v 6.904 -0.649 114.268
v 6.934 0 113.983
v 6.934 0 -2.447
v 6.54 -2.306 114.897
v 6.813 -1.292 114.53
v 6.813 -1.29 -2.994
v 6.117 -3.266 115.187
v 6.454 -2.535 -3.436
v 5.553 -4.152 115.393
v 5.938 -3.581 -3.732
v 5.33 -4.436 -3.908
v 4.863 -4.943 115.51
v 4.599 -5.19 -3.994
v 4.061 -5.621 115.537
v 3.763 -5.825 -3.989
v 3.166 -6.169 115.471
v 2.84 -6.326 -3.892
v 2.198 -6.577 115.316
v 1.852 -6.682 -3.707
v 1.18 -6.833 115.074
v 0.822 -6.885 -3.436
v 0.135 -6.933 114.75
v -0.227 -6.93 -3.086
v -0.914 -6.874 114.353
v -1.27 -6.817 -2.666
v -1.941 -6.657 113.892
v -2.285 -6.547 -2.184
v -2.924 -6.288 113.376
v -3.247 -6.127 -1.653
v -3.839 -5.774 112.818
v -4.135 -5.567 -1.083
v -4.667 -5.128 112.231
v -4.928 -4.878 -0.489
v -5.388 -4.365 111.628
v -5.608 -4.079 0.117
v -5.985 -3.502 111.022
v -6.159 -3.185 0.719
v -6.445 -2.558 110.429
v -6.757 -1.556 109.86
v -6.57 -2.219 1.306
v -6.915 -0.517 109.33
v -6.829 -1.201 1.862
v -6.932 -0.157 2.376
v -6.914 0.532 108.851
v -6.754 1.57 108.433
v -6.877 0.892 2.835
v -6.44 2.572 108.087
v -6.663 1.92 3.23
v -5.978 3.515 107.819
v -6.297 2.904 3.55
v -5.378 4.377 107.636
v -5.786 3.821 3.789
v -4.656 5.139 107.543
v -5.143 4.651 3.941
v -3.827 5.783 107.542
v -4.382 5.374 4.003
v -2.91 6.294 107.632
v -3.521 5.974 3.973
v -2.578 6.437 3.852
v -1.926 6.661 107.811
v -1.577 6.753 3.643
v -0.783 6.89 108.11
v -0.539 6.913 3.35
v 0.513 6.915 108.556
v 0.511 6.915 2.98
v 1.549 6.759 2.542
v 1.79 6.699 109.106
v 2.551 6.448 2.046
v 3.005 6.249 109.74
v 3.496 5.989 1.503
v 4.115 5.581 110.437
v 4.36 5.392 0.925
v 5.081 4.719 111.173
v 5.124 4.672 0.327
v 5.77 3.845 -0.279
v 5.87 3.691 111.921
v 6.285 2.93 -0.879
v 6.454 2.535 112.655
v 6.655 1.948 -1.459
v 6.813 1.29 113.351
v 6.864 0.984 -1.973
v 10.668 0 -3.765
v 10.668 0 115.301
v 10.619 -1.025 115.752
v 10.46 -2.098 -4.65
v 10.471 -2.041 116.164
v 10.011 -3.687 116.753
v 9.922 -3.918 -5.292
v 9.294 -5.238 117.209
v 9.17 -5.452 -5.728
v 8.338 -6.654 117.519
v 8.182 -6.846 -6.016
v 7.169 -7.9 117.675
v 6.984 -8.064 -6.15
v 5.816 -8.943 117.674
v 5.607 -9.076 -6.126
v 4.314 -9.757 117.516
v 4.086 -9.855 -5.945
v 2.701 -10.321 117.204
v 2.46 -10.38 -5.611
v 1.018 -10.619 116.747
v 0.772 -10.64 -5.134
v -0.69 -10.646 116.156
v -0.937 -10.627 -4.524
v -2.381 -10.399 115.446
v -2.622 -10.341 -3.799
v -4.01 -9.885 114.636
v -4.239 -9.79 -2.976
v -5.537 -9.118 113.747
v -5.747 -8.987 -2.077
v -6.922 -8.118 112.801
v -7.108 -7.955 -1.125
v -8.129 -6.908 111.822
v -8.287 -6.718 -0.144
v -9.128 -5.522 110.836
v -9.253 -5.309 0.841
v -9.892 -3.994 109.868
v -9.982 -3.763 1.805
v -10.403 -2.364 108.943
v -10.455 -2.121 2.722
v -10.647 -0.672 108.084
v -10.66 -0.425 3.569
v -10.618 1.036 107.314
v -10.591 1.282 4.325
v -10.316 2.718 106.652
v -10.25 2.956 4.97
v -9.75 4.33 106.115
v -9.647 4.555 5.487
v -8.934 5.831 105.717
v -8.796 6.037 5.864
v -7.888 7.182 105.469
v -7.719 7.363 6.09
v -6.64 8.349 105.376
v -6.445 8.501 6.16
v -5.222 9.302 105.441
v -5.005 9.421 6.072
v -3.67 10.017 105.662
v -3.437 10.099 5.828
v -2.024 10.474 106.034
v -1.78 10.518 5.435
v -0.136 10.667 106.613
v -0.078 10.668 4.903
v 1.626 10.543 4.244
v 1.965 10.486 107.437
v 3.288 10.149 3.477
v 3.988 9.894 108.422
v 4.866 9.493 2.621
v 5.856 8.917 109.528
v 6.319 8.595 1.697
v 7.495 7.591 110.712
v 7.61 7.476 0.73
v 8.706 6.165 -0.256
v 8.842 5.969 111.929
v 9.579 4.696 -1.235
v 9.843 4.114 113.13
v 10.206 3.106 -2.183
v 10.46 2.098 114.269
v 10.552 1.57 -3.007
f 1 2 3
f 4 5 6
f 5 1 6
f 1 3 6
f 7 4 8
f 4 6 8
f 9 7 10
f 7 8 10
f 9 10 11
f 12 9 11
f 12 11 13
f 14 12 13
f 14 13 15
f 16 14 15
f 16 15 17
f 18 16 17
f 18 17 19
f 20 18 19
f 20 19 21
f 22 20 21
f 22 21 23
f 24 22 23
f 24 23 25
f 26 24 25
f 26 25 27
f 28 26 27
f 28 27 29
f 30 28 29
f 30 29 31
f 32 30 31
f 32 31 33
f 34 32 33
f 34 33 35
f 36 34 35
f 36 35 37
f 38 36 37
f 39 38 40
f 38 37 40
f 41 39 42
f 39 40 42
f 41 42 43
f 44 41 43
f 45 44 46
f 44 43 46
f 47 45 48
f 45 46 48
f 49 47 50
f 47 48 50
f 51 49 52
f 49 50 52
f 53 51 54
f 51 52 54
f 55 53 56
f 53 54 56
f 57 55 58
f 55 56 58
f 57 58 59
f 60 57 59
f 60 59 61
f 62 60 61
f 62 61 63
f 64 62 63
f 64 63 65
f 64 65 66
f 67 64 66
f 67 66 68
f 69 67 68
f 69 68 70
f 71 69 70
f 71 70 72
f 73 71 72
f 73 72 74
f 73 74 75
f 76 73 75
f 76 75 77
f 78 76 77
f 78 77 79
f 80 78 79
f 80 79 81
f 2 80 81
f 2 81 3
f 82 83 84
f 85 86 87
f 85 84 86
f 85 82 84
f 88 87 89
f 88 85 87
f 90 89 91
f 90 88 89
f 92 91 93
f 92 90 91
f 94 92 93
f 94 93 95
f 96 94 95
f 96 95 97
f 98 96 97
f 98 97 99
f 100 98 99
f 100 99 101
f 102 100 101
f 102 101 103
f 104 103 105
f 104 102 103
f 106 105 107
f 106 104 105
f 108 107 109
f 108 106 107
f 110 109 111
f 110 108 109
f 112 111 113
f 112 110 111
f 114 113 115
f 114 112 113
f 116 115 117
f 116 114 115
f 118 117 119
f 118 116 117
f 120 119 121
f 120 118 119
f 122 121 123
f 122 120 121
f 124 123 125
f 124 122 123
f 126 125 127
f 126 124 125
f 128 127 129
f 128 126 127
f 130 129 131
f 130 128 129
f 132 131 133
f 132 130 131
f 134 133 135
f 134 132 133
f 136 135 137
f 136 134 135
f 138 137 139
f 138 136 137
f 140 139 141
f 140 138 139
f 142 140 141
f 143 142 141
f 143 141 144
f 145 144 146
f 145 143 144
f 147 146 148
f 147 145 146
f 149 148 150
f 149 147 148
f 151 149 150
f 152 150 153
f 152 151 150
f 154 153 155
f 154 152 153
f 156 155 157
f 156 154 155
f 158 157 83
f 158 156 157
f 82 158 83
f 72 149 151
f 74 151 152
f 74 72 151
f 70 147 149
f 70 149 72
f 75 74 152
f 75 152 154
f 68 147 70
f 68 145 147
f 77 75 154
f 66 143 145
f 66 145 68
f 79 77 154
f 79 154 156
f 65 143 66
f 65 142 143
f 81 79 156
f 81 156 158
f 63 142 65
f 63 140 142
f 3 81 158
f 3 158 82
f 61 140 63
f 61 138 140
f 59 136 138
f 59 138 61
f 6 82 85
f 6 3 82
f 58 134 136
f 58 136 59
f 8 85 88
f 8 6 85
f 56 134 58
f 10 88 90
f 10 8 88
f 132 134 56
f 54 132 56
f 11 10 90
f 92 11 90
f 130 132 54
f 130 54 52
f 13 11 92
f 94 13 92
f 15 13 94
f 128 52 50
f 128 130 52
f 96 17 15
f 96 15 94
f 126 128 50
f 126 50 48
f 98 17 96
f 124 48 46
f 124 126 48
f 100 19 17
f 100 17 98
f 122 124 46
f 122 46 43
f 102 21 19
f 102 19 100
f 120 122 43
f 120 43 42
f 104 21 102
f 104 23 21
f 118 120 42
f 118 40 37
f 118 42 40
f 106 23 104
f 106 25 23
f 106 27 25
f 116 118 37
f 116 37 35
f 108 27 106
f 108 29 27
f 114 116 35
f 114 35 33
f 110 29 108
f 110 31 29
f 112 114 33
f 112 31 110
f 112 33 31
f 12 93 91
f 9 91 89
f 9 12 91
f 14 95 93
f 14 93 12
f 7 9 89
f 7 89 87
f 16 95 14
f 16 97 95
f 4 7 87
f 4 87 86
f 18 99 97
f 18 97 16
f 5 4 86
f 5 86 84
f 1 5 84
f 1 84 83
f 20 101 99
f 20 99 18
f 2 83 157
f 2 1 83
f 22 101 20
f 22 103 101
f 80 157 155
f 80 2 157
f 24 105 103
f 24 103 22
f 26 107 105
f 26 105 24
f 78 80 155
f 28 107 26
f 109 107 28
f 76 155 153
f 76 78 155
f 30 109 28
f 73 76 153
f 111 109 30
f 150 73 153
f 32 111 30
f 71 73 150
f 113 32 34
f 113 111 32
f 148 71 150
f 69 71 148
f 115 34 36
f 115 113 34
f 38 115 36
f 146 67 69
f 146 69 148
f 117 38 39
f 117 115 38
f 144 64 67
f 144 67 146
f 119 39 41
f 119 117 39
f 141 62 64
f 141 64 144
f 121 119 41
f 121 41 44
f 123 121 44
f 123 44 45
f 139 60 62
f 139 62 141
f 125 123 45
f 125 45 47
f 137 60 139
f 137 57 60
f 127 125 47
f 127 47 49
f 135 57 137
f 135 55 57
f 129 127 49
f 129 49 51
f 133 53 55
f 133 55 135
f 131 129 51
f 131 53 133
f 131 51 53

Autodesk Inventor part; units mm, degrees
ref_plane "Start Plane" through (0, 0, -8.6396) normal (0, 0, 1) x (1, 0, 0)
ref_plane "End Plane" through (0, 0, 120.1752) normal (0, 0, 1) x (1, 0, 0)
sketch "Sketch" plane through (0, 0, 0) normal (0, 0, 1) x (1, 0, 0)
  circle A0 centre (0, 0) radius 6.9342
  circle A1 centre (0, 0) radius 10.668
  dimension "d0" = 21.336
  dimension "d1" = 3.7338
extrude "Body" add sketch "Sketch" along normal up to surface (128.8148 mm away) from surface at -8.6396
sketch "Sketch3" plane through (0, 0, 0) normal (0, 0, 1) x (1, 0, 0)
  line L0 (0, 0) -> (10, 0)
ref_plane "Work Plane3" through (0, 0, 0) normal (0, -1, 0) x (1, 0, 0)
sketch "Sketch4" plane through (0, 0, 0) normal (0, -1, 0) x (1, 0, 0)
  line L0 (-2, -8.6396) -> (12, -8.6396)
  line L1 (-2, 120.1752) -> (12, 120.1752)
  dimension "d7" = 128.8148
ref_plane "Work Plane4" through (6.5224, -8.4419, 117.6947) normal (-0.3057, 0.3957, 0.866) x (0.9499, 0.0648, 0.3057)
split "Split1" plane through (6.5224, -8.4419, 117.6947) removes the side toward (-0.3057, 0.3957, 0.866)
ref_plane "Work Plane5" through (6.5224, -8.4419, -6.1592) normal (-0.3057, 0.3957, -0.866) x (0.3025, 0.9028, 0.3057)
split "Split2" plane through (6.5224, -8.4419, -6.1592) removes the side toward (-0.3057, 0.3957, -0.866)
equation "\"d0\" = G_H"
equation "\"d1\" = G_T"
equation "\"d2\" = G_L"
equation "\"G_H\" = 21.336"
equation "\"G_T\" = 3.7338"
equation "\"G_L\" = 123.85392"
equation "\"G_OFFSET_START\" = 8.6396"
equation "\"G_OFFSET_END\" = 8.6396"
equation "\"d4\" = -G_OFFSET_START"
equation "\"d5\" = G_OFFSET_END + B_L"
equation "\"B_L\" = 111.53557"
properties part number "ANSI - 1/2 x 0.147 - 4.876" material "Steel, Mild"
